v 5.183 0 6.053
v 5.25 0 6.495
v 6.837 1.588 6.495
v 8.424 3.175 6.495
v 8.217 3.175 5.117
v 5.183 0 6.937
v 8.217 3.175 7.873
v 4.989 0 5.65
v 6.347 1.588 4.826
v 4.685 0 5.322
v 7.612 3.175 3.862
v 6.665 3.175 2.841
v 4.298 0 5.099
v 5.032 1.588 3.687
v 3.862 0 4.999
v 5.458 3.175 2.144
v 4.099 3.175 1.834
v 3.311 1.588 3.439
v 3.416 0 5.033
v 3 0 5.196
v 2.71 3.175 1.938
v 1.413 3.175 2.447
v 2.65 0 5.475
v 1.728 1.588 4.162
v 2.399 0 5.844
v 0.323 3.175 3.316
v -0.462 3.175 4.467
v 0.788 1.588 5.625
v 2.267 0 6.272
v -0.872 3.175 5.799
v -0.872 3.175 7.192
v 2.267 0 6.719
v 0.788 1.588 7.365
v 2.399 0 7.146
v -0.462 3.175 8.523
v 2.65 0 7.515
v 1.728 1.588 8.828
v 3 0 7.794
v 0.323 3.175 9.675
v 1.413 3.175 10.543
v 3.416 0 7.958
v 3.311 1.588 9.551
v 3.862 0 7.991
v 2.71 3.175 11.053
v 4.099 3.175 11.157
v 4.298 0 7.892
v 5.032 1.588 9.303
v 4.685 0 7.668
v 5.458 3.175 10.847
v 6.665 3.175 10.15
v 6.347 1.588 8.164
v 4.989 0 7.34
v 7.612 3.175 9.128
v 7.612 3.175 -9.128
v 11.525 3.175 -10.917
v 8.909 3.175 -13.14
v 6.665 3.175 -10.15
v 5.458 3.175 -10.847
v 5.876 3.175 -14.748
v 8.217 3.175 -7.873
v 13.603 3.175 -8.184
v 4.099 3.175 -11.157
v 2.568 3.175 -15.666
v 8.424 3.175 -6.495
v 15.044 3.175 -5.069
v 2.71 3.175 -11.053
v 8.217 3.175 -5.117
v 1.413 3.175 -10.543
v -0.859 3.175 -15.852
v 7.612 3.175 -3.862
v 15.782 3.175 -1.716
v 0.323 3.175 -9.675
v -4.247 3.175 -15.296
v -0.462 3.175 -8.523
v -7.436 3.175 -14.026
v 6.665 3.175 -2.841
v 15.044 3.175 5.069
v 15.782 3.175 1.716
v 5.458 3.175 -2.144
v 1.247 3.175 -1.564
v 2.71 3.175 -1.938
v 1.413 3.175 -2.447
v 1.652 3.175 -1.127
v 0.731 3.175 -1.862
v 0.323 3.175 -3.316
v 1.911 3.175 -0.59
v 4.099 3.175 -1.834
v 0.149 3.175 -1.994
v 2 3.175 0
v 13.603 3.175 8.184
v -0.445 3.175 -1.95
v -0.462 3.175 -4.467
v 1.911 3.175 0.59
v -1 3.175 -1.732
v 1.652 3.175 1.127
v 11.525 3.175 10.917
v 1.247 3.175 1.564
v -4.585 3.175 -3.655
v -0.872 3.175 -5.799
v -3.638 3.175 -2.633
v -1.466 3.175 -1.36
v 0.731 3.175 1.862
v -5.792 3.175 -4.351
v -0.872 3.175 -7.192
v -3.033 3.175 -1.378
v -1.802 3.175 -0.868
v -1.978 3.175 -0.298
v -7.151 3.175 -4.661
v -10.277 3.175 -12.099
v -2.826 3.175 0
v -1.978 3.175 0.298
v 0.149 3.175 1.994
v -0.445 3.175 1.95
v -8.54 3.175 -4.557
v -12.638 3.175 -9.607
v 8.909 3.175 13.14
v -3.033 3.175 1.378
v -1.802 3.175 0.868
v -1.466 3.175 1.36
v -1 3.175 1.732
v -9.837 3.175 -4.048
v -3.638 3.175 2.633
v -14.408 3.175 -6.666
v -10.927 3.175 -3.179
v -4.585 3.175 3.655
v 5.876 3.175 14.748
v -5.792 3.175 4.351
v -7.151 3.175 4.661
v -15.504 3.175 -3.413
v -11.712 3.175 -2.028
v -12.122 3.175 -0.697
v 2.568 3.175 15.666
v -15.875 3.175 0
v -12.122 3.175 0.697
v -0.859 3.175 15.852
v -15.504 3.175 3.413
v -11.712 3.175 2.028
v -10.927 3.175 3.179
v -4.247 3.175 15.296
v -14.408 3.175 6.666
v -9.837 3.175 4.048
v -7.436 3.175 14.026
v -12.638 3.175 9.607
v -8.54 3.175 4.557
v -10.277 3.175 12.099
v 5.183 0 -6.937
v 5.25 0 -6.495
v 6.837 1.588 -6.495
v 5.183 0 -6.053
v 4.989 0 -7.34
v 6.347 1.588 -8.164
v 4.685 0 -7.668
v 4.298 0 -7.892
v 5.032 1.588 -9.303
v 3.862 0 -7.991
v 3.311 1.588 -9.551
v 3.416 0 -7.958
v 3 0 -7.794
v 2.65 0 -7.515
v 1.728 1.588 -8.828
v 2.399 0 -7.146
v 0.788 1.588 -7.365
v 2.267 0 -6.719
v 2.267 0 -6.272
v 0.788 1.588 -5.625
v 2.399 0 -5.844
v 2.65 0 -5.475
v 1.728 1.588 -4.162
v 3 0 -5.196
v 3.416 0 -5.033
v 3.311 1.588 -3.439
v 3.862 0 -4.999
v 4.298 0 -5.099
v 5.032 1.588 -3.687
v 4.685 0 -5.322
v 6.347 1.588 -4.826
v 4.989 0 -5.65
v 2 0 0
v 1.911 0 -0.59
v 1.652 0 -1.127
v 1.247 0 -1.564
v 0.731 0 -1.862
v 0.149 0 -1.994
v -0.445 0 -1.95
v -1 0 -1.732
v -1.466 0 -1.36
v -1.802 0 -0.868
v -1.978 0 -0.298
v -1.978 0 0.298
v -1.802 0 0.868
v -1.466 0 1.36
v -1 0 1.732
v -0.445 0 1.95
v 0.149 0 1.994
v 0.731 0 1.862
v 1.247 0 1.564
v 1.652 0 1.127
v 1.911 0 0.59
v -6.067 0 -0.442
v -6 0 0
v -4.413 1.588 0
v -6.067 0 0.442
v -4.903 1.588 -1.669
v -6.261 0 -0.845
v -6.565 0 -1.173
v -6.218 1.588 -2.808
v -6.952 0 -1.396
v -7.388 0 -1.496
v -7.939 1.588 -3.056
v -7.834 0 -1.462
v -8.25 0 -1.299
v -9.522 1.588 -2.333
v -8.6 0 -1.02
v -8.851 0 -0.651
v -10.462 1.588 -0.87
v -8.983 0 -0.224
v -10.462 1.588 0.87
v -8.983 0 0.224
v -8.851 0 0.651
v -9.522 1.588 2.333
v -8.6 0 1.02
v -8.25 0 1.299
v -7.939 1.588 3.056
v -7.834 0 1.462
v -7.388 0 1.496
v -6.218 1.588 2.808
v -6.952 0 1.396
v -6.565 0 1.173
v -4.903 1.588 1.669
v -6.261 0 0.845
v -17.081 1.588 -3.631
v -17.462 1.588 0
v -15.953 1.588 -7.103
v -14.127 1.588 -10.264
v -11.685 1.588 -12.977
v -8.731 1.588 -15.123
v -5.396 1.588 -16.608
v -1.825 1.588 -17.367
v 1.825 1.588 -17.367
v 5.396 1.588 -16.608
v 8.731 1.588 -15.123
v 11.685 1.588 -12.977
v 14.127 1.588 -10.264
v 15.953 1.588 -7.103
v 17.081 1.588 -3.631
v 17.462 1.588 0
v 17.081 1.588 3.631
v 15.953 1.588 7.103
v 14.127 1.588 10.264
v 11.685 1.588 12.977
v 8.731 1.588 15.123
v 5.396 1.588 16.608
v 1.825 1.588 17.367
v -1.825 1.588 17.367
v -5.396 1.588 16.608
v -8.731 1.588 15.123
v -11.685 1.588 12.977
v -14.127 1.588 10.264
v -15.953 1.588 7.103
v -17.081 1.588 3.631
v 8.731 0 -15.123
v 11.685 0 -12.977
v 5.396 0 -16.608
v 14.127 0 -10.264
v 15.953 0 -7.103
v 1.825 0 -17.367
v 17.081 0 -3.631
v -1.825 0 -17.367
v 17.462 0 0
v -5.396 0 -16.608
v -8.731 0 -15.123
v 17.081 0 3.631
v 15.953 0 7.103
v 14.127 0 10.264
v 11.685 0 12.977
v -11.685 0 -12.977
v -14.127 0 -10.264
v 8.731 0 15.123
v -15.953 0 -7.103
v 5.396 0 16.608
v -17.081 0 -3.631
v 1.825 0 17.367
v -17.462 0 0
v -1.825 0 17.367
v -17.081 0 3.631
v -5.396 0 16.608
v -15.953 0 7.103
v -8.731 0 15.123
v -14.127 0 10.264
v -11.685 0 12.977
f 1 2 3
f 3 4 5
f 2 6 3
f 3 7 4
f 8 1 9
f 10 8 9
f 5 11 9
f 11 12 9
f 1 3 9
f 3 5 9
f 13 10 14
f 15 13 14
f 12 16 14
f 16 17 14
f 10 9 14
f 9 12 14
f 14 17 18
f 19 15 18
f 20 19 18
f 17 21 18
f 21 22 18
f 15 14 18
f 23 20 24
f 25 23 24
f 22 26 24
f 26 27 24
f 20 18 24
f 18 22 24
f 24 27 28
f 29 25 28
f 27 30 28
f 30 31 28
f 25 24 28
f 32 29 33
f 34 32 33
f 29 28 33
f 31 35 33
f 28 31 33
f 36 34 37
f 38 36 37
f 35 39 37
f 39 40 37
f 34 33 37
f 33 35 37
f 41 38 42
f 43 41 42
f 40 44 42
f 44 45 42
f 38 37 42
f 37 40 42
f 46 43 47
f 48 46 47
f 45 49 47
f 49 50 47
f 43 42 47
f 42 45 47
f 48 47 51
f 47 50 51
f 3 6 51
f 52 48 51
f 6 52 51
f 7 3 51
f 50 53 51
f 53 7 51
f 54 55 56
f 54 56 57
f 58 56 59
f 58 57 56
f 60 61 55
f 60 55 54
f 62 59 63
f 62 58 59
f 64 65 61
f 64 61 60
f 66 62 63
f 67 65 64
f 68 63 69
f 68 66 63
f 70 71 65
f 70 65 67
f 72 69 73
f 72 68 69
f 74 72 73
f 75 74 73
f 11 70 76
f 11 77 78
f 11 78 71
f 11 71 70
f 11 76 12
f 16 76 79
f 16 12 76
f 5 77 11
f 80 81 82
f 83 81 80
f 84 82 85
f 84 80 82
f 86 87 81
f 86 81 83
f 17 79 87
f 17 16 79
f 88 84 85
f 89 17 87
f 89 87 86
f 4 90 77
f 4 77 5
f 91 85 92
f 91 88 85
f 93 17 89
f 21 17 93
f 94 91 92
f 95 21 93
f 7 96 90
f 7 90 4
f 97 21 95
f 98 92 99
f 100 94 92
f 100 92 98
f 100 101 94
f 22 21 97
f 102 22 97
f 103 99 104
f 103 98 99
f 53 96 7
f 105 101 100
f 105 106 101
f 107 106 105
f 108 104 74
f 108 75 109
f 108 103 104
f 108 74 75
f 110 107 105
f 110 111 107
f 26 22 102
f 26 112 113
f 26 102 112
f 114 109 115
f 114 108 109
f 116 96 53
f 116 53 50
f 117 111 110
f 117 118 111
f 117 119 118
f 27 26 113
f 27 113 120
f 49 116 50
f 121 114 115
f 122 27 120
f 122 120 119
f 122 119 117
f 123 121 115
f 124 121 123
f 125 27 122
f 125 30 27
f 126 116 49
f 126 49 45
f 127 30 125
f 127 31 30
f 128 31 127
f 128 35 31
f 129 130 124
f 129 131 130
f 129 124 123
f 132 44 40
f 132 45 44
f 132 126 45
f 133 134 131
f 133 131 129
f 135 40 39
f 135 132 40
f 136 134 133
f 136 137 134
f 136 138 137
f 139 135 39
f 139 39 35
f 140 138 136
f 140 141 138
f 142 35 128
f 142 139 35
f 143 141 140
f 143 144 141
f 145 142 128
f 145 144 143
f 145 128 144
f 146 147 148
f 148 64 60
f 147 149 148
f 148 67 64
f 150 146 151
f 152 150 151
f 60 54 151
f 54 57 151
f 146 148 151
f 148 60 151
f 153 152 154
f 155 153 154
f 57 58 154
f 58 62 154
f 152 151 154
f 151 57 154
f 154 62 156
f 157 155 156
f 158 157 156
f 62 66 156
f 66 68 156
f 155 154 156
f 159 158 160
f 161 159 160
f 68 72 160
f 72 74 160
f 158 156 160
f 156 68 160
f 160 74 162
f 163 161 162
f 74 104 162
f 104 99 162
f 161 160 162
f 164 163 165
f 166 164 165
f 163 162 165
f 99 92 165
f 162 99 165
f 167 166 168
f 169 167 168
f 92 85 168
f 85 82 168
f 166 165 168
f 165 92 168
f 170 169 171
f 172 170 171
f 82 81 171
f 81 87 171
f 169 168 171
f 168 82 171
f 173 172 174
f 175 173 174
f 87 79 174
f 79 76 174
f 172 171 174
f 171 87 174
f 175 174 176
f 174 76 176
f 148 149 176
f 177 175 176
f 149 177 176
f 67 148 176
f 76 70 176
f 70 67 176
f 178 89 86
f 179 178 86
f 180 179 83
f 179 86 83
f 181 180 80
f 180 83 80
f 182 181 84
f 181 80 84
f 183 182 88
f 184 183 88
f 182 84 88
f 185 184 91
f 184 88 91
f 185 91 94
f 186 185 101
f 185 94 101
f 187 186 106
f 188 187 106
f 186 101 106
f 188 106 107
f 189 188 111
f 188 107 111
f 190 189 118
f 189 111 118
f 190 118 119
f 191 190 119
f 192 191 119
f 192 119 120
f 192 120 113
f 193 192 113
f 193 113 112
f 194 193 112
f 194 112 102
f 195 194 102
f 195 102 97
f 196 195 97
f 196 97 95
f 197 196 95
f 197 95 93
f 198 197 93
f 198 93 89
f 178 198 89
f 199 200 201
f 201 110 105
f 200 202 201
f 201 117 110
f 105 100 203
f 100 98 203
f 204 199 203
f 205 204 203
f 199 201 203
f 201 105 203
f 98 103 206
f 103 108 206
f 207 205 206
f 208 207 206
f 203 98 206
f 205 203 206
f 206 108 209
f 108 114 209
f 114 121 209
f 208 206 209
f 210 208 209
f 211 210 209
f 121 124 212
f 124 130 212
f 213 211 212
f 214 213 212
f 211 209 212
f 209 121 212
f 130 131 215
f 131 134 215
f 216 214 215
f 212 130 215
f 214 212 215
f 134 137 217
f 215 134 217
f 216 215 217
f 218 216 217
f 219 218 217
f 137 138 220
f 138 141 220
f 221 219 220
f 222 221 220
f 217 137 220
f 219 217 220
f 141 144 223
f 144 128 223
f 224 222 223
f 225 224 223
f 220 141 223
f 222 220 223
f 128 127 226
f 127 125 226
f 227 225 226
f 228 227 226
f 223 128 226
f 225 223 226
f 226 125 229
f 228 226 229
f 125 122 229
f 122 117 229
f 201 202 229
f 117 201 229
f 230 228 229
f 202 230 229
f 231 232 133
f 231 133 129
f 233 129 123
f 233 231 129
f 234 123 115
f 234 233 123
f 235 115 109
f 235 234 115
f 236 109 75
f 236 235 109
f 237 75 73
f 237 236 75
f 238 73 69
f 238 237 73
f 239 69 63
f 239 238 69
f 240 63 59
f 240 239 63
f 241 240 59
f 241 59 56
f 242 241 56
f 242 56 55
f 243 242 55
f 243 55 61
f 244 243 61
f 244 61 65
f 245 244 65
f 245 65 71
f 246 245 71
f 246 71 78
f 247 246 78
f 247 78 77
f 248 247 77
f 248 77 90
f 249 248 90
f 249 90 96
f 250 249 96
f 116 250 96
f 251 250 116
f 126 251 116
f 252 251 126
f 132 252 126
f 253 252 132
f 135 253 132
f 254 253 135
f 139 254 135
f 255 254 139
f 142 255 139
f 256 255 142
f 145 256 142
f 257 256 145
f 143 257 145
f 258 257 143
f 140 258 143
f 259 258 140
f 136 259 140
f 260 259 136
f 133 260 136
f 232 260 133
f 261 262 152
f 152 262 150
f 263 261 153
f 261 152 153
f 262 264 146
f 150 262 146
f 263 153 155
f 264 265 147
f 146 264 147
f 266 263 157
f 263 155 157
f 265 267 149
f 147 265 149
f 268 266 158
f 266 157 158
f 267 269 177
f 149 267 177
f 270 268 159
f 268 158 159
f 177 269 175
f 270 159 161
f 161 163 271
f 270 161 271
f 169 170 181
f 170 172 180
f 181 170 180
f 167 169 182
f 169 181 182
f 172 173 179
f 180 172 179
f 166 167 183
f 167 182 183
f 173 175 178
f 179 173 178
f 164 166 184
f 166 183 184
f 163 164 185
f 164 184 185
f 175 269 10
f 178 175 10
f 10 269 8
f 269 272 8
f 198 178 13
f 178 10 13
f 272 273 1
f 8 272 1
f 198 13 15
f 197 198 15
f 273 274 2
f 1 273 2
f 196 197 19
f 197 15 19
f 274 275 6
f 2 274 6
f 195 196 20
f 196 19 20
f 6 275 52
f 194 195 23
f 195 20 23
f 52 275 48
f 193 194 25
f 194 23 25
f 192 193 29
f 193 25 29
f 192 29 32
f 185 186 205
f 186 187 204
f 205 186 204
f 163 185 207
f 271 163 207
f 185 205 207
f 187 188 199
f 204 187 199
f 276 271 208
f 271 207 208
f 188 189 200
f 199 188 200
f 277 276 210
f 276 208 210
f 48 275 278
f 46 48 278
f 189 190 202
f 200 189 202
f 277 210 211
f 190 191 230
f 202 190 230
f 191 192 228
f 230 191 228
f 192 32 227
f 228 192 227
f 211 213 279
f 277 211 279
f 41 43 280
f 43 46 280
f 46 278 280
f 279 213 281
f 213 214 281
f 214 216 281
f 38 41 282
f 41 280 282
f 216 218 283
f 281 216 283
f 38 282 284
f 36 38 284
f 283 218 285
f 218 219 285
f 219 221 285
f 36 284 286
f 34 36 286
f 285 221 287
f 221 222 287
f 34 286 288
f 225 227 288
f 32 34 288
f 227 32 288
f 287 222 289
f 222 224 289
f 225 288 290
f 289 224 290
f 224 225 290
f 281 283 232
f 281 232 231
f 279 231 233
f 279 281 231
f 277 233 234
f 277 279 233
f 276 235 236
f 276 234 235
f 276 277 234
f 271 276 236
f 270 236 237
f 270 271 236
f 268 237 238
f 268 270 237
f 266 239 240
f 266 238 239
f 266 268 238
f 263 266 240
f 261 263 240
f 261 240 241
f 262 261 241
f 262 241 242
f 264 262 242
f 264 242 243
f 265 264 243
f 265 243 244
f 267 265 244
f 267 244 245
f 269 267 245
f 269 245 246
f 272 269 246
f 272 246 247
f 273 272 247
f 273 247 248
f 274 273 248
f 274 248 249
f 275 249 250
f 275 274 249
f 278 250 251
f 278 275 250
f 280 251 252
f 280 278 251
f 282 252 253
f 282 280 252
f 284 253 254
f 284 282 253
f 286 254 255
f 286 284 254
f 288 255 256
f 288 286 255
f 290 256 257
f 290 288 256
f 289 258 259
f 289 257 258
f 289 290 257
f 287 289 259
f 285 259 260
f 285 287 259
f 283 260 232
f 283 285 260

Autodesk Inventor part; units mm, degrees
ref_plane "YZ Plane" through (0, 0, 0) normal (1, 0, 0) x (0, 1, 0)
ref_plane "XZ Plane" through (0, 0, 0) normal (0, 1, 0) x (-1, 0, 0)
ref_plane "XY Plane" through (0, 0, 0) normal (0, 0, 1) x (1, 0, 0)
sketch "Sketch1" plane through (0, 0, 0) normal (0, 1, 0) x (-1, 0, 0)
  circle A0 centre (0, 0) radius 17.4625
  line L0 (0, 0) -> (17.4625, 0) construction
  dimension "d0" = 34.925
extrude "Extrusion1" add sketch "Sketch1" along normal blind 3.175
sketch "Sketch2" plane through (0, 3.175, 0) normal (0, 1, 0) x (1, 0, 0)
  circle A0 centre (0, 0) radius 2
  line L0 (0, 0) -> (-14.2875, 0) construction
  arc A1 (-12.8229, 3.4359) -> (-12.8229, -3.4359) centre (-9.525, 0) ccw projected
  circle A2 centre (0, 0) radius 7.5 construction
  circle A3 centre (-7.5, 0) radius 1.5
  circle A4 centre (3.75, -6.4952) radius 1.5
  circle A5 centre (3.75, 6.4952) radius 1.5
  dimension "d10" = 15
  dimension "d9" = 4
  dimension "d11" = 3
  dimension "d14" = 360
extrude "Extrusion2" cut sketch "Sketch2" against normal through all
chamfer "Chamfer1" distance 3.175 angle 45 3 edges at (-9, 3.175, 0) (2.25, 3.175, -6.4952) (2.25, 3.175, 6.4952)
chamfer "Chamfer2" distance 1.5875 angle 45 1 edges at (17.4625, 3.175, 0)
properties part number "Hub Cap" material "Nylon 6/6"
